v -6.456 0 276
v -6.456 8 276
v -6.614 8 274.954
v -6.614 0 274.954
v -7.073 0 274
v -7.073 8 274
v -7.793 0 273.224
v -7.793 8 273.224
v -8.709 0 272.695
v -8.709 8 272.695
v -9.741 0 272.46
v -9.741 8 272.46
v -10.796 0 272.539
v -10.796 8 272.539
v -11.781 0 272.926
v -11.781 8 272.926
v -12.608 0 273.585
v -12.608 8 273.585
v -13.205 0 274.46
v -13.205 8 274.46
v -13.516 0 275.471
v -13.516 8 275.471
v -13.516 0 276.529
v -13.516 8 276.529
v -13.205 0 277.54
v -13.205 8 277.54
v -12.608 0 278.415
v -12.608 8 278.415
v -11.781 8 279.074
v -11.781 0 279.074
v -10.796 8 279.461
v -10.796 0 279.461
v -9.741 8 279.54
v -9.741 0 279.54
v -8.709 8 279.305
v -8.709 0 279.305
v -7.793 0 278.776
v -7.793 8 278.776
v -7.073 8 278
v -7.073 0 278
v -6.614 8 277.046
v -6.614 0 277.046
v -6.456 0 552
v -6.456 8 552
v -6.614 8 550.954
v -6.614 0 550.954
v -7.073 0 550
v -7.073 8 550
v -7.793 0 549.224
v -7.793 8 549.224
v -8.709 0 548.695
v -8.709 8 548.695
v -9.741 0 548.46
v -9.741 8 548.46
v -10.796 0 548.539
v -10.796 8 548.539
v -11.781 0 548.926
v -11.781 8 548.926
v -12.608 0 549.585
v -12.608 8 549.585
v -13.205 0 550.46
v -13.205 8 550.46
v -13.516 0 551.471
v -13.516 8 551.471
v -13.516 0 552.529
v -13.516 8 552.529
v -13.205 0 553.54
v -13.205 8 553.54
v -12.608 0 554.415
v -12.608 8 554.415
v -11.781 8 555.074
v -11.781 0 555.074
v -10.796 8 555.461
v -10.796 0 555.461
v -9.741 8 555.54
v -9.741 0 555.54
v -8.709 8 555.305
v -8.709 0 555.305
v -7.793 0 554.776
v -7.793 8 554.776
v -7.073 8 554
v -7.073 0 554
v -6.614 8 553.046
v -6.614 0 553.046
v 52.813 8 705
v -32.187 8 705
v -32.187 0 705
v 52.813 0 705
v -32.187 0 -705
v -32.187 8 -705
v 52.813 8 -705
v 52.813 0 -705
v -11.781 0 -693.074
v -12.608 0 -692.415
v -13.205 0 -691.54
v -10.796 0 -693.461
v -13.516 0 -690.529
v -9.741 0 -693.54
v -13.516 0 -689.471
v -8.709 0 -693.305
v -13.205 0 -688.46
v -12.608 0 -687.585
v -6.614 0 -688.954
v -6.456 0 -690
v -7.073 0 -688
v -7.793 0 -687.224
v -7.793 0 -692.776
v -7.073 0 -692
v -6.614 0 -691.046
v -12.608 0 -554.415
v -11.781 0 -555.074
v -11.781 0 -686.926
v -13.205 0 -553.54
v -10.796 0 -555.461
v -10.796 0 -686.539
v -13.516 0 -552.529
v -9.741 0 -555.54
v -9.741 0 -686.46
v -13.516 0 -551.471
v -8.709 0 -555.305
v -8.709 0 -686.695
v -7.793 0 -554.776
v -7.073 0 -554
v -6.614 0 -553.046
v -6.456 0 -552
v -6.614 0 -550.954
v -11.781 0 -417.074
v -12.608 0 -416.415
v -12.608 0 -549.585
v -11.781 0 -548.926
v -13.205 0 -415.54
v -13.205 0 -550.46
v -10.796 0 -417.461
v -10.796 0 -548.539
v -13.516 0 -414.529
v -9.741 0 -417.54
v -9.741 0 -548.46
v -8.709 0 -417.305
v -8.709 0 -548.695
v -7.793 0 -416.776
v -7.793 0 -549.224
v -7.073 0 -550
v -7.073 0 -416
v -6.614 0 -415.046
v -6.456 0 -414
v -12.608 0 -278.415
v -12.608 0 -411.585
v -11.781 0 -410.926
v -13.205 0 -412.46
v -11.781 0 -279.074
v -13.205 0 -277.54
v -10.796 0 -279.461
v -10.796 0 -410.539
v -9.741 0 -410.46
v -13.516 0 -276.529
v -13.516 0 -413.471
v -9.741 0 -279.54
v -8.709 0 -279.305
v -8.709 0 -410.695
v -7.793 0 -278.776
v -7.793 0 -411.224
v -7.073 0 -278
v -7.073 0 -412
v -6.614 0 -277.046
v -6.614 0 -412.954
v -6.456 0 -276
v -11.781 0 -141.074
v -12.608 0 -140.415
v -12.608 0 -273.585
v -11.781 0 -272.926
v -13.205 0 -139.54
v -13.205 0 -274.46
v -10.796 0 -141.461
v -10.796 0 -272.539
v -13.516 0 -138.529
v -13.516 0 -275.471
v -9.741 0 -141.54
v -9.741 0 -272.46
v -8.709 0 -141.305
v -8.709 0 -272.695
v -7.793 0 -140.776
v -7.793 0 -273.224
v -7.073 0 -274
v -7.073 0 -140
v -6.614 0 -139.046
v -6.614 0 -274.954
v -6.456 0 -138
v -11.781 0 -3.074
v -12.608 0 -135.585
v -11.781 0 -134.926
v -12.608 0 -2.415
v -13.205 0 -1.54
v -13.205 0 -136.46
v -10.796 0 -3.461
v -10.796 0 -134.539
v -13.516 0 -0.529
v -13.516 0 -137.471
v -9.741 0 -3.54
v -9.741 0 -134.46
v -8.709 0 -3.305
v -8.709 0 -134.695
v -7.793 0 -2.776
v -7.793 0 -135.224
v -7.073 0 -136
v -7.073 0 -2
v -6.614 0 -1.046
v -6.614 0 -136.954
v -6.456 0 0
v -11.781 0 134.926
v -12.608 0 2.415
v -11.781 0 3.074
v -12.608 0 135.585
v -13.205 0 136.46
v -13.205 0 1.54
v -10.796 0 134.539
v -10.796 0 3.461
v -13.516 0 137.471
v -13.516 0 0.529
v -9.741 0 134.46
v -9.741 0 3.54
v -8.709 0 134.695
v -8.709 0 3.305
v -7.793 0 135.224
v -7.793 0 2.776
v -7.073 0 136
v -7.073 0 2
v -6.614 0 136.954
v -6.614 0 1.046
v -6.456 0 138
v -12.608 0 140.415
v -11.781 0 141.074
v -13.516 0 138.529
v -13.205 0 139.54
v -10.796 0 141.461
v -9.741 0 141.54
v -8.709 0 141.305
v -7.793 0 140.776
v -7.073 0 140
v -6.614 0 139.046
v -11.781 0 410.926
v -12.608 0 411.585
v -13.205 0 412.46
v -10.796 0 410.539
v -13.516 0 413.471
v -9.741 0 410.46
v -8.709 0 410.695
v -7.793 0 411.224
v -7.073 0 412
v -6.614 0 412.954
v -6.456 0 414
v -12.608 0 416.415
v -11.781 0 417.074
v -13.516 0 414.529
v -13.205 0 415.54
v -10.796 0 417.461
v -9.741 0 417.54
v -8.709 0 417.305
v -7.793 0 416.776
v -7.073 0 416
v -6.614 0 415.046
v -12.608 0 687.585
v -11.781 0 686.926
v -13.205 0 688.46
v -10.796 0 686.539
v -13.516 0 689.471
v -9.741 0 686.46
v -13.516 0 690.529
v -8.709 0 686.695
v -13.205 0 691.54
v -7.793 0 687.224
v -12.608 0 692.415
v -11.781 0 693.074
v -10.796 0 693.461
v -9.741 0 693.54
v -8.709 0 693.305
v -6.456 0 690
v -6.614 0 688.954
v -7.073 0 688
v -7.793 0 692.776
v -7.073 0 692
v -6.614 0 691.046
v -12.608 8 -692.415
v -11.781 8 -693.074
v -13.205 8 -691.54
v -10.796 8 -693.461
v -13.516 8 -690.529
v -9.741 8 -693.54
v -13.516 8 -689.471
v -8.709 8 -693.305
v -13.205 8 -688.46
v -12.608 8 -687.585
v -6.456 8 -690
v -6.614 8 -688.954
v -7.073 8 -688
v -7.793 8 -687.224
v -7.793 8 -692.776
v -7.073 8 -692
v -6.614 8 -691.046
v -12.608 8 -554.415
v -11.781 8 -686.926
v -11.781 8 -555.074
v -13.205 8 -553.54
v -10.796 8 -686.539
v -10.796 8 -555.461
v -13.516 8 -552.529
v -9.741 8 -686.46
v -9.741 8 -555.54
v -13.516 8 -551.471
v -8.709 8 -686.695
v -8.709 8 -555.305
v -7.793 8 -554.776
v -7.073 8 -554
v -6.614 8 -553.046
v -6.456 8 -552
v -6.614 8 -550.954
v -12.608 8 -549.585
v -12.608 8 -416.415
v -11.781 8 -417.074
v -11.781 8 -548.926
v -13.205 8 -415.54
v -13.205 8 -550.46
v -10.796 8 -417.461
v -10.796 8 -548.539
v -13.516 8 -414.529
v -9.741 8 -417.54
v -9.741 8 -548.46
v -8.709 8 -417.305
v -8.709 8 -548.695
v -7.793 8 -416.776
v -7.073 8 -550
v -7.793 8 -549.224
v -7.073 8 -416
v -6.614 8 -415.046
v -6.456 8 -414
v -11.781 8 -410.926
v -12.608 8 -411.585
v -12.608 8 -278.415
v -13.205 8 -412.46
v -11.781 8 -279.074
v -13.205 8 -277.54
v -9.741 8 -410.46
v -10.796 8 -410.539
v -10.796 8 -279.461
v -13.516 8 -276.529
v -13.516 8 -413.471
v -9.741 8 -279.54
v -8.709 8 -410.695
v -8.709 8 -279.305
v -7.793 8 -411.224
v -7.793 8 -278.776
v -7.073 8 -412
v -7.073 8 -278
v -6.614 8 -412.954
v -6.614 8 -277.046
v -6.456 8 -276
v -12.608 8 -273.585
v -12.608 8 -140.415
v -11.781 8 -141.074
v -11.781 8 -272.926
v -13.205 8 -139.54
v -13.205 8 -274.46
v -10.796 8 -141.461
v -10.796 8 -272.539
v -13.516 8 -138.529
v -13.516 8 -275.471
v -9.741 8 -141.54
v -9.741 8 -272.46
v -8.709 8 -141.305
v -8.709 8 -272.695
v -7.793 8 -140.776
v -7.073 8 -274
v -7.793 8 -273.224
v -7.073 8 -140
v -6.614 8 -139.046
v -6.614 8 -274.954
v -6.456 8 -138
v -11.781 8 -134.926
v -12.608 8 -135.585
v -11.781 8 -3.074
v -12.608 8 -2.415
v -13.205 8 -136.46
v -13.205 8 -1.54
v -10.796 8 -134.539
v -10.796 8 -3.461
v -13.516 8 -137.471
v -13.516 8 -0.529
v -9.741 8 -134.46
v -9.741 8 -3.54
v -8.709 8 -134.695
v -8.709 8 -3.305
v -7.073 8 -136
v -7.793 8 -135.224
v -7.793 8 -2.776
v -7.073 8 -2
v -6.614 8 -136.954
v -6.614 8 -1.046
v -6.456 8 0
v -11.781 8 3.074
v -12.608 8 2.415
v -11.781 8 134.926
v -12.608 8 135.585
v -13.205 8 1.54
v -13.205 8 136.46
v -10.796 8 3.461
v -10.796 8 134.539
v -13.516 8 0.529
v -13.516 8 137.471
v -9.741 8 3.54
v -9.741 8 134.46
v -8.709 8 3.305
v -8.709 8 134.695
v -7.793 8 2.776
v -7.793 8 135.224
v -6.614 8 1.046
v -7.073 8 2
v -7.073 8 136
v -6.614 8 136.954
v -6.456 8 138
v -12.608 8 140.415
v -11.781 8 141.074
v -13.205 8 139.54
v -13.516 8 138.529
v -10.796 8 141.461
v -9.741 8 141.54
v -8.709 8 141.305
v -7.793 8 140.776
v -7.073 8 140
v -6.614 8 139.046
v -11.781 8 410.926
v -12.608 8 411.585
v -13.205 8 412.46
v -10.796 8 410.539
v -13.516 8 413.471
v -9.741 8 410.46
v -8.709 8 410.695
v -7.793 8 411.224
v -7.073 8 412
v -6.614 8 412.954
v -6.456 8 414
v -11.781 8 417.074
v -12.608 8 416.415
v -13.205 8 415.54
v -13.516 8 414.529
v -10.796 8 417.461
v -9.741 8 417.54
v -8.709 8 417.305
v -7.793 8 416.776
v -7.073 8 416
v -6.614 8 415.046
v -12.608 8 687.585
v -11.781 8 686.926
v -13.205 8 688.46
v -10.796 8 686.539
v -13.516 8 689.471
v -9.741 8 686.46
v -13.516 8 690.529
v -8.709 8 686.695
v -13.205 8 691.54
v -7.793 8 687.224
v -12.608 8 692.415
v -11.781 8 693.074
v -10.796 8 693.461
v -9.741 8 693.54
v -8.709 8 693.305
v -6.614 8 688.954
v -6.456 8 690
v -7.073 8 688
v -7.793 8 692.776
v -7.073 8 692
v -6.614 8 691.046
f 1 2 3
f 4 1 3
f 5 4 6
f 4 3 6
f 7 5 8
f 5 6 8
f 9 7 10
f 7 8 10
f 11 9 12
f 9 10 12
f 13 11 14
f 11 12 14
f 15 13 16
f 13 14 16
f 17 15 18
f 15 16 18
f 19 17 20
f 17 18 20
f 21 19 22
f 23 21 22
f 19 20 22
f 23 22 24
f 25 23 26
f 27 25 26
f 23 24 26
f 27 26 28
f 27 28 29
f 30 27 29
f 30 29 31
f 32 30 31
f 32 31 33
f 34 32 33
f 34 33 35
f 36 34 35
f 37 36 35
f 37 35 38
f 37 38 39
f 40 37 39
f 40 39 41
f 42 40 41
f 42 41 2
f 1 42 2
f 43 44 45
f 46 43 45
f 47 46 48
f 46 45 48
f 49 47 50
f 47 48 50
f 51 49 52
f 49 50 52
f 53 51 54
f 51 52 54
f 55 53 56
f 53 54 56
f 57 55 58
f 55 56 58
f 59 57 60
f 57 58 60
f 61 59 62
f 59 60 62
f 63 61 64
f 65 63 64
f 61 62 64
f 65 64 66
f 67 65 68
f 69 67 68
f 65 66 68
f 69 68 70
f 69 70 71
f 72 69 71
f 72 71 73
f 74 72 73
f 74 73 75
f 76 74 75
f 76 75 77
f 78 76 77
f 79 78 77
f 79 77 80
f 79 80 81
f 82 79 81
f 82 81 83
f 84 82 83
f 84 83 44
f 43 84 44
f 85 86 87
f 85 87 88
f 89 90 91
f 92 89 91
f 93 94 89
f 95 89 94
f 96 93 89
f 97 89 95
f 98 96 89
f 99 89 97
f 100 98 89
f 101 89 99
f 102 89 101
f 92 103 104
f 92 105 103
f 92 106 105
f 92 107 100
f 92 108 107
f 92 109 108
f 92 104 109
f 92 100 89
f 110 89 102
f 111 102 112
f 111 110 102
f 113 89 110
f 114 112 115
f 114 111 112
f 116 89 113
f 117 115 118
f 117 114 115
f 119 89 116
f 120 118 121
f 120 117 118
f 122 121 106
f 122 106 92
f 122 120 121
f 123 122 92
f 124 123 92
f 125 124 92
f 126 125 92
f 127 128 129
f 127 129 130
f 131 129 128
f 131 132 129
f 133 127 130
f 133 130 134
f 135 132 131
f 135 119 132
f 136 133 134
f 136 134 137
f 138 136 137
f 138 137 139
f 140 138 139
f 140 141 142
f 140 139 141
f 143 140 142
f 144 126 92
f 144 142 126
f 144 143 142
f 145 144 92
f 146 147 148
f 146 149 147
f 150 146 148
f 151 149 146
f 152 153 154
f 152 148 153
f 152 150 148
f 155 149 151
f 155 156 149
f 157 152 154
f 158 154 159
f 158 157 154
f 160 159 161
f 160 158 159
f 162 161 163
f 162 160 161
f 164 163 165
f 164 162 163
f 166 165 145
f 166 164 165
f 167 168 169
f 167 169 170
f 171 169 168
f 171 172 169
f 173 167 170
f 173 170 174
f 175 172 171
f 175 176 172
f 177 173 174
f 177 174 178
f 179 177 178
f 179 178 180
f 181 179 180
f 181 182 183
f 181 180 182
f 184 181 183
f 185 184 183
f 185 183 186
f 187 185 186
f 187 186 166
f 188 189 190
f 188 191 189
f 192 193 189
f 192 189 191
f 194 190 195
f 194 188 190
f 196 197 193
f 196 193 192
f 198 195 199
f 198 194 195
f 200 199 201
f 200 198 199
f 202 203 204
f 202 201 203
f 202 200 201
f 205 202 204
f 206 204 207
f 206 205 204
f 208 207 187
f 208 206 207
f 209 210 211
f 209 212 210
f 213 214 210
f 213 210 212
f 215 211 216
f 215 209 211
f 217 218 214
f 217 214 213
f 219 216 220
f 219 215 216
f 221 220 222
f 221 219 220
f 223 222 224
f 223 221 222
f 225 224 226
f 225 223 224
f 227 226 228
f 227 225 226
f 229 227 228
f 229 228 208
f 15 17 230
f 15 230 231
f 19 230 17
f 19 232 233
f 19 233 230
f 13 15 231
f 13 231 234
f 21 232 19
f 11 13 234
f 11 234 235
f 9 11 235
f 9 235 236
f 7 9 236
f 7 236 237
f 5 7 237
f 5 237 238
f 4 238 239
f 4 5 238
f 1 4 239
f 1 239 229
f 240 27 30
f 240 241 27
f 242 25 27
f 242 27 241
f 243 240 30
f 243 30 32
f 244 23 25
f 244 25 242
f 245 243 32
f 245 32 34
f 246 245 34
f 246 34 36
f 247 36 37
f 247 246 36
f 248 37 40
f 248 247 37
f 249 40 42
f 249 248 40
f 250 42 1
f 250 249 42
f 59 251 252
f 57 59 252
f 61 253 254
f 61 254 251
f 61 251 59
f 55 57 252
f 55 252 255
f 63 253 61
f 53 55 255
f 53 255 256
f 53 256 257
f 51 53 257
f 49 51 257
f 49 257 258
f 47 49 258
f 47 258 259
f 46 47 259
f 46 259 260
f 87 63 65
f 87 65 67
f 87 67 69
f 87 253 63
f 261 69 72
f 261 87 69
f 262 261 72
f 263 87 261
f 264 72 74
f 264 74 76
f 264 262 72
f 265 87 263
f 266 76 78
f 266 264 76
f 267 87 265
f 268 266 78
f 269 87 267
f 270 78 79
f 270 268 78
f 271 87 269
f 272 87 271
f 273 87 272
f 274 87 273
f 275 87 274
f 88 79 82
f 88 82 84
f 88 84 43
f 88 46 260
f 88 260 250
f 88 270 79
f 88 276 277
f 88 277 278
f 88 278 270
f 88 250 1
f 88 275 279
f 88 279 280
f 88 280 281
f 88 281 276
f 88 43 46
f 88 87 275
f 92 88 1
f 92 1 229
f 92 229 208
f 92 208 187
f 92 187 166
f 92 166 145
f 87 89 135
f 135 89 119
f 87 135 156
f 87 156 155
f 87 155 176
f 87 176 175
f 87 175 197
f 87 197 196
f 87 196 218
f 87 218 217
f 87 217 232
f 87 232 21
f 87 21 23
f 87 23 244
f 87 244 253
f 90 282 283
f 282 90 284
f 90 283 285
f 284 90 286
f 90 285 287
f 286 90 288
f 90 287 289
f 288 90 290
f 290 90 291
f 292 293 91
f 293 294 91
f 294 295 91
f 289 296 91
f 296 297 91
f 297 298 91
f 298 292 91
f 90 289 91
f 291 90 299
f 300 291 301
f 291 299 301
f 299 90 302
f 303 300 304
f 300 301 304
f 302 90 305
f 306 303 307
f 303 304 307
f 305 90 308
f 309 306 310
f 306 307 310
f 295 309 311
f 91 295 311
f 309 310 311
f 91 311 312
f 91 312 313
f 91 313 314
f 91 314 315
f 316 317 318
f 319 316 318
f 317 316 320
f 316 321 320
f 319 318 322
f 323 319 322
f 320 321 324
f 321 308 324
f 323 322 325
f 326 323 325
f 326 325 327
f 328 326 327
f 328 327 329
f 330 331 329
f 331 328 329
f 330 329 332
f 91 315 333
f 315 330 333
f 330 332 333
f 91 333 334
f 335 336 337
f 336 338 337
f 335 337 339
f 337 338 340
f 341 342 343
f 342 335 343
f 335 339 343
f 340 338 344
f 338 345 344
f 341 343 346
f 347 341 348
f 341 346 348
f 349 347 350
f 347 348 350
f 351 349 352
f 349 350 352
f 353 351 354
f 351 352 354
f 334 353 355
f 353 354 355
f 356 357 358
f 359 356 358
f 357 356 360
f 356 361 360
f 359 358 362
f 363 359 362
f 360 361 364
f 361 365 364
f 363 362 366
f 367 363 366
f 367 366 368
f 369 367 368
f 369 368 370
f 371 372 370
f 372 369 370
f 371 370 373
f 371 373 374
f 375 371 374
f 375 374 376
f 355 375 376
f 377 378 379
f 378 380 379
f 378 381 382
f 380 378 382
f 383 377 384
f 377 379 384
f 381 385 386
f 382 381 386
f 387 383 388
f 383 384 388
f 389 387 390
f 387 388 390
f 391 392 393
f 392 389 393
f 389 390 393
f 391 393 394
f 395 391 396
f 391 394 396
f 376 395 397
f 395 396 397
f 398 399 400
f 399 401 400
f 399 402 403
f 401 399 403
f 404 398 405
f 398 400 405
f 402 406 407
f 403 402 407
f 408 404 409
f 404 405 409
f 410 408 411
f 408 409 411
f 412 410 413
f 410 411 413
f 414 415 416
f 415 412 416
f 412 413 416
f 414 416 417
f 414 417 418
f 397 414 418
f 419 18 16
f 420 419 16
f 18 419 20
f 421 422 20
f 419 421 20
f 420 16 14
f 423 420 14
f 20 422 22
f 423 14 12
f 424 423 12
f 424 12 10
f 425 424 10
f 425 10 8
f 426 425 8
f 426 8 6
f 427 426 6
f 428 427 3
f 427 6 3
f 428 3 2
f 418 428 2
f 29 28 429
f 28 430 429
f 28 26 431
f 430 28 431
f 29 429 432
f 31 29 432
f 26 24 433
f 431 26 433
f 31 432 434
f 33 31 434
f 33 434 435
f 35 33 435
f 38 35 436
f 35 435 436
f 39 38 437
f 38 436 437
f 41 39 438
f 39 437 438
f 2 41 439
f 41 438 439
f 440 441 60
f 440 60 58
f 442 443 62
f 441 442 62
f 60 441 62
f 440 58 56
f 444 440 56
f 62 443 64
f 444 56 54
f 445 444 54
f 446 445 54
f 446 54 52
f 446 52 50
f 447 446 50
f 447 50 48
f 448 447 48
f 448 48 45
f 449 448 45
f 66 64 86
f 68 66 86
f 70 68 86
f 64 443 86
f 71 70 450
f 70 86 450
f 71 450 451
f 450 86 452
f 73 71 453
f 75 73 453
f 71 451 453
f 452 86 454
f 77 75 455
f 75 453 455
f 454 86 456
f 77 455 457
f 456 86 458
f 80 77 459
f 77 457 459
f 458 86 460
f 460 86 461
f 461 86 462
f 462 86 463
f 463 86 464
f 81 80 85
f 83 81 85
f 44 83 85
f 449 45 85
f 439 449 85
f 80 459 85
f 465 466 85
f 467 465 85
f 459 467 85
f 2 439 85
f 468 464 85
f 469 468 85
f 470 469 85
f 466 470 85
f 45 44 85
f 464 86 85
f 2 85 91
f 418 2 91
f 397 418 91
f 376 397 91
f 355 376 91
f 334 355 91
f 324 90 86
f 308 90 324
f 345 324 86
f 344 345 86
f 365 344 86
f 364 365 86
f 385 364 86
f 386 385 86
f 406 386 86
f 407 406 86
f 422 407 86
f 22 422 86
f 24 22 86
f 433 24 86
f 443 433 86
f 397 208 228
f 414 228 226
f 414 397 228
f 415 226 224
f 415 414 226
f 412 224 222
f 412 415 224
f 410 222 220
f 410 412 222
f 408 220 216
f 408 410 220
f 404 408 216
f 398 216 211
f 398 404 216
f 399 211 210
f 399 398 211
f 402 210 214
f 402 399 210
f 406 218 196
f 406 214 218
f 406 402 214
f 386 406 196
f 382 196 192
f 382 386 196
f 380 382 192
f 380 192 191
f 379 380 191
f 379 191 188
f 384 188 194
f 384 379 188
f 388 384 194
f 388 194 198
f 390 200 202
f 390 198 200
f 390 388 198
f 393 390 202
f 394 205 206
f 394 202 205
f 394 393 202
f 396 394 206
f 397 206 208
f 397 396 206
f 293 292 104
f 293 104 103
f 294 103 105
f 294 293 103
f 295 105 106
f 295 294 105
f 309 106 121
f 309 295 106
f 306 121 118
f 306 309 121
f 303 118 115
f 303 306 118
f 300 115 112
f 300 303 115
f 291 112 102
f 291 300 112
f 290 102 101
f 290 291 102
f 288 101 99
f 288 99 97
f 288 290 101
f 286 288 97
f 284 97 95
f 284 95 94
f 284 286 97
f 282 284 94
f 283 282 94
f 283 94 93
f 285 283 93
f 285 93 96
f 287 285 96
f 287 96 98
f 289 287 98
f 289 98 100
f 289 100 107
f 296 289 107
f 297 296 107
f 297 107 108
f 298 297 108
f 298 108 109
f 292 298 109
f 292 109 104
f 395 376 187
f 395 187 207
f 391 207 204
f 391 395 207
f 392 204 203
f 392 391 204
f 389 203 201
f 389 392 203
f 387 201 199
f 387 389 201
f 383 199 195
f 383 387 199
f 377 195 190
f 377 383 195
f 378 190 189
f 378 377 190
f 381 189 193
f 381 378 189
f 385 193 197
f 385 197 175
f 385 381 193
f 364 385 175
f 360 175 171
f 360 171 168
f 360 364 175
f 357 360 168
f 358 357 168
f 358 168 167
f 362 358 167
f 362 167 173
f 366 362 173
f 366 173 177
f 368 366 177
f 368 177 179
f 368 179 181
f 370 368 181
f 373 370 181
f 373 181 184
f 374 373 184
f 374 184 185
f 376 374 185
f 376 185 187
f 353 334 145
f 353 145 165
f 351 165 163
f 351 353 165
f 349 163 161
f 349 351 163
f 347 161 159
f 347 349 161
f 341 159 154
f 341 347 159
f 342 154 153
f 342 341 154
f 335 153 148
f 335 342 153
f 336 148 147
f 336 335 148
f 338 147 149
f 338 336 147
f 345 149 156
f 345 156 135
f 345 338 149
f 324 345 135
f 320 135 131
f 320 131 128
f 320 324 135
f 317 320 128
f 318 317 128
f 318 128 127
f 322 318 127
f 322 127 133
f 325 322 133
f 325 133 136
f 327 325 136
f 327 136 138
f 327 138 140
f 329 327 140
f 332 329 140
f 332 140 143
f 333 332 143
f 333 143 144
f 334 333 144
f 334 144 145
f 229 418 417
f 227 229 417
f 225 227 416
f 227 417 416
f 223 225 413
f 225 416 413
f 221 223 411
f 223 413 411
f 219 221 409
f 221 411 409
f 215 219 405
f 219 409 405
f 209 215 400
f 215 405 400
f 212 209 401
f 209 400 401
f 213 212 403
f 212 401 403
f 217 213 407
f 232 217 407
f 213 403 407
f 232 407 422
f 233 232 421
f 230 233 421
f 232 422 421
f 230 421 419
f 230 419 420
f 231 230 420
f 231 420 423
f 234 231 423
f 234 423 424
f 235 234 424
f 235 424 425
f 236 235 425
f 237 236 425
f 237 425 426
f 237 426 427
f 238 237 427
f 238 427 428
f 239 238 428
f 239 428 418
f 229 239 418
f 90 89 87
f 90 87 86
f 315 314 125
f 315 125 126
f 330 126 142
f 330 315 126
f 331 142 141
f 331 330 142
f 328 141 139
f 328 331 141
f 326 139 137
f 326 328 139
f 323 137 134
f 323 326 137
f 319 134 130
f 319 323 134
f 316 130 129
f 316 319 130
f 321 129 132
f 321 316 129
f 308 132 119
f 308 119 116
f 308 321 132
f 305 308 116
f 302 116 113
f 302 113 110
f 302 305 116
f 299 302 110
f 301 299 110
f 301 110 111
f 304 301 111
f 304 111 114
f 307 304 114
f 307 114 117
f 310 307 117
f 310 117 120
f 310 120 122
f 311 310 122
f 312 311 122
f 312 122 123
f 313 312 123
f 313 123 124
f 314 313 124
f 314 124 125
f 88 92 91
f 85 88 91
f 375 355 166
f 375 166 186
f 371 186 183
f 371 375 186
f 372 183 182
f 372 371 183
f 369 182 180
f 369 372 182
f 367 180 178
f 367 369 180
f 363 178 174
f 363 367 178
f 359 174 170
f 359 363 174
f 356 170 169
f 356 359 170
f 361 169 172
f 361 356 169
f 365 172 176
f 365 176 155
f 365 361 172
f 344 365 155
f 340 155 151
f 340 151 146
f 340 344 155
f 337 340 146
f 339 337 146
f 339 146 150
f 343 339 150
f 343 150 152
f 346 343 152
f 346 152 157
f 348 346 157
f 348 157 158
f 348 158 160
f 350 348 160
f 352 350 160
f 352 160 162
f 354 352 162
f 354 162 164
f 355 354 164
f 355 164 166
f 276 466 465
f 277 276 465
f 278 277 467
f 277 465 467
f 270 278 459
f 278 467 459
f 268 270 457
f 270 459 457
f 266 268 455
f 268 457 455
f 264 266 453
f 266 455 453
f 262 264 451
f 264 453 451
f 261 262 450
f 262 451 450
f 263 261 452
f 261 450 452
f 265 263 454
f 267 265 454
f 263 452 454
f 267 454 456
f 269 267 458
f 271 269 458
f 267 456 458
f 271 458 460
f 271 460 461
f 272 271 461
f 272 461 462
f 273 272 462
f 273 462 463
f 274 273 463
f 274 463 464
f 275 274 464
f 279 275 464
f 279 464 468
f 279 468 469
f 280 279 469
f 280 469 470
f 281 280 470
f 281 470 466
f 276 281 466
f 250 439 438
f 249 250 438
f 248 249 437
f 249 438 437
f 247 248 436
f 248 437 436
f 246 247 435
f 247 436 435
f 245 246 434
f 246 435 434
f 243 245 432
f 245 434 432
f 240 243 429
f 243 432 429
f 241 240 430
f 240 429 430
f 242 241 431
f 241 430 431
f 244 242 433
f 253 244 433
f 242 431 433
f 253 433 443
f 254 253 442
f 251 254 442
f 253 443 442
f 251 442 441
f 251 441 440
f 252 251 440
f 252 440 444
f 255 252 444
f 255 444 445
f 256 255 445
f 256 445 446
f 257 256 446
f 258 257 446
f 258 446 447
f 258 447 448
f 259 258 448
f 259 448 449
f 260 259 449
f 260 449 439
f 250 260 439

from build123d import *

# Parameters (mm, degrees)
SKETCH_1_W          = 85
SKETCH_1_H          = 8
EXTRUDE_1_DEPTH     = 705
HOLE_WIZARD_M6_51_D = 7.1


with BuildPart() as part:
    # Эскиз1 → Бобышка-Вытянуть1 (new body)
    with BuildSketch(Plane.XY):
        with Locations((10.313375116, 4)):
            Rectangle(SKETCH_1_W, SKETCH_1_H)
    extrude(amount=EXTRUDE_1_DEPTH)

    # Отверстие с зазором M6.51 (through all)
    with Locations(Plane(origin=(0, 0, 0), x_dir=(-1, 0, 0), z_dir=(0, -1, 0))):
        with Locations((10.006096654, -690), (10.006096654, -552), (10.006096654, -414), (10.006096654, -138), (10.006096654, 0), (10.006096654, -276)):
            Hole(HOLE_WIZARD_M6_51_D / 2)

    # Зеркальное отражение1: part across plane


with BuildPart() as part_1:
    add(part.part)
    add(part.part.mirror(Plane(origin=(0, 0, 0), x_dir=(1, 0, 0), z_dir=(0, 0, -1))))


solid = part_1.part
